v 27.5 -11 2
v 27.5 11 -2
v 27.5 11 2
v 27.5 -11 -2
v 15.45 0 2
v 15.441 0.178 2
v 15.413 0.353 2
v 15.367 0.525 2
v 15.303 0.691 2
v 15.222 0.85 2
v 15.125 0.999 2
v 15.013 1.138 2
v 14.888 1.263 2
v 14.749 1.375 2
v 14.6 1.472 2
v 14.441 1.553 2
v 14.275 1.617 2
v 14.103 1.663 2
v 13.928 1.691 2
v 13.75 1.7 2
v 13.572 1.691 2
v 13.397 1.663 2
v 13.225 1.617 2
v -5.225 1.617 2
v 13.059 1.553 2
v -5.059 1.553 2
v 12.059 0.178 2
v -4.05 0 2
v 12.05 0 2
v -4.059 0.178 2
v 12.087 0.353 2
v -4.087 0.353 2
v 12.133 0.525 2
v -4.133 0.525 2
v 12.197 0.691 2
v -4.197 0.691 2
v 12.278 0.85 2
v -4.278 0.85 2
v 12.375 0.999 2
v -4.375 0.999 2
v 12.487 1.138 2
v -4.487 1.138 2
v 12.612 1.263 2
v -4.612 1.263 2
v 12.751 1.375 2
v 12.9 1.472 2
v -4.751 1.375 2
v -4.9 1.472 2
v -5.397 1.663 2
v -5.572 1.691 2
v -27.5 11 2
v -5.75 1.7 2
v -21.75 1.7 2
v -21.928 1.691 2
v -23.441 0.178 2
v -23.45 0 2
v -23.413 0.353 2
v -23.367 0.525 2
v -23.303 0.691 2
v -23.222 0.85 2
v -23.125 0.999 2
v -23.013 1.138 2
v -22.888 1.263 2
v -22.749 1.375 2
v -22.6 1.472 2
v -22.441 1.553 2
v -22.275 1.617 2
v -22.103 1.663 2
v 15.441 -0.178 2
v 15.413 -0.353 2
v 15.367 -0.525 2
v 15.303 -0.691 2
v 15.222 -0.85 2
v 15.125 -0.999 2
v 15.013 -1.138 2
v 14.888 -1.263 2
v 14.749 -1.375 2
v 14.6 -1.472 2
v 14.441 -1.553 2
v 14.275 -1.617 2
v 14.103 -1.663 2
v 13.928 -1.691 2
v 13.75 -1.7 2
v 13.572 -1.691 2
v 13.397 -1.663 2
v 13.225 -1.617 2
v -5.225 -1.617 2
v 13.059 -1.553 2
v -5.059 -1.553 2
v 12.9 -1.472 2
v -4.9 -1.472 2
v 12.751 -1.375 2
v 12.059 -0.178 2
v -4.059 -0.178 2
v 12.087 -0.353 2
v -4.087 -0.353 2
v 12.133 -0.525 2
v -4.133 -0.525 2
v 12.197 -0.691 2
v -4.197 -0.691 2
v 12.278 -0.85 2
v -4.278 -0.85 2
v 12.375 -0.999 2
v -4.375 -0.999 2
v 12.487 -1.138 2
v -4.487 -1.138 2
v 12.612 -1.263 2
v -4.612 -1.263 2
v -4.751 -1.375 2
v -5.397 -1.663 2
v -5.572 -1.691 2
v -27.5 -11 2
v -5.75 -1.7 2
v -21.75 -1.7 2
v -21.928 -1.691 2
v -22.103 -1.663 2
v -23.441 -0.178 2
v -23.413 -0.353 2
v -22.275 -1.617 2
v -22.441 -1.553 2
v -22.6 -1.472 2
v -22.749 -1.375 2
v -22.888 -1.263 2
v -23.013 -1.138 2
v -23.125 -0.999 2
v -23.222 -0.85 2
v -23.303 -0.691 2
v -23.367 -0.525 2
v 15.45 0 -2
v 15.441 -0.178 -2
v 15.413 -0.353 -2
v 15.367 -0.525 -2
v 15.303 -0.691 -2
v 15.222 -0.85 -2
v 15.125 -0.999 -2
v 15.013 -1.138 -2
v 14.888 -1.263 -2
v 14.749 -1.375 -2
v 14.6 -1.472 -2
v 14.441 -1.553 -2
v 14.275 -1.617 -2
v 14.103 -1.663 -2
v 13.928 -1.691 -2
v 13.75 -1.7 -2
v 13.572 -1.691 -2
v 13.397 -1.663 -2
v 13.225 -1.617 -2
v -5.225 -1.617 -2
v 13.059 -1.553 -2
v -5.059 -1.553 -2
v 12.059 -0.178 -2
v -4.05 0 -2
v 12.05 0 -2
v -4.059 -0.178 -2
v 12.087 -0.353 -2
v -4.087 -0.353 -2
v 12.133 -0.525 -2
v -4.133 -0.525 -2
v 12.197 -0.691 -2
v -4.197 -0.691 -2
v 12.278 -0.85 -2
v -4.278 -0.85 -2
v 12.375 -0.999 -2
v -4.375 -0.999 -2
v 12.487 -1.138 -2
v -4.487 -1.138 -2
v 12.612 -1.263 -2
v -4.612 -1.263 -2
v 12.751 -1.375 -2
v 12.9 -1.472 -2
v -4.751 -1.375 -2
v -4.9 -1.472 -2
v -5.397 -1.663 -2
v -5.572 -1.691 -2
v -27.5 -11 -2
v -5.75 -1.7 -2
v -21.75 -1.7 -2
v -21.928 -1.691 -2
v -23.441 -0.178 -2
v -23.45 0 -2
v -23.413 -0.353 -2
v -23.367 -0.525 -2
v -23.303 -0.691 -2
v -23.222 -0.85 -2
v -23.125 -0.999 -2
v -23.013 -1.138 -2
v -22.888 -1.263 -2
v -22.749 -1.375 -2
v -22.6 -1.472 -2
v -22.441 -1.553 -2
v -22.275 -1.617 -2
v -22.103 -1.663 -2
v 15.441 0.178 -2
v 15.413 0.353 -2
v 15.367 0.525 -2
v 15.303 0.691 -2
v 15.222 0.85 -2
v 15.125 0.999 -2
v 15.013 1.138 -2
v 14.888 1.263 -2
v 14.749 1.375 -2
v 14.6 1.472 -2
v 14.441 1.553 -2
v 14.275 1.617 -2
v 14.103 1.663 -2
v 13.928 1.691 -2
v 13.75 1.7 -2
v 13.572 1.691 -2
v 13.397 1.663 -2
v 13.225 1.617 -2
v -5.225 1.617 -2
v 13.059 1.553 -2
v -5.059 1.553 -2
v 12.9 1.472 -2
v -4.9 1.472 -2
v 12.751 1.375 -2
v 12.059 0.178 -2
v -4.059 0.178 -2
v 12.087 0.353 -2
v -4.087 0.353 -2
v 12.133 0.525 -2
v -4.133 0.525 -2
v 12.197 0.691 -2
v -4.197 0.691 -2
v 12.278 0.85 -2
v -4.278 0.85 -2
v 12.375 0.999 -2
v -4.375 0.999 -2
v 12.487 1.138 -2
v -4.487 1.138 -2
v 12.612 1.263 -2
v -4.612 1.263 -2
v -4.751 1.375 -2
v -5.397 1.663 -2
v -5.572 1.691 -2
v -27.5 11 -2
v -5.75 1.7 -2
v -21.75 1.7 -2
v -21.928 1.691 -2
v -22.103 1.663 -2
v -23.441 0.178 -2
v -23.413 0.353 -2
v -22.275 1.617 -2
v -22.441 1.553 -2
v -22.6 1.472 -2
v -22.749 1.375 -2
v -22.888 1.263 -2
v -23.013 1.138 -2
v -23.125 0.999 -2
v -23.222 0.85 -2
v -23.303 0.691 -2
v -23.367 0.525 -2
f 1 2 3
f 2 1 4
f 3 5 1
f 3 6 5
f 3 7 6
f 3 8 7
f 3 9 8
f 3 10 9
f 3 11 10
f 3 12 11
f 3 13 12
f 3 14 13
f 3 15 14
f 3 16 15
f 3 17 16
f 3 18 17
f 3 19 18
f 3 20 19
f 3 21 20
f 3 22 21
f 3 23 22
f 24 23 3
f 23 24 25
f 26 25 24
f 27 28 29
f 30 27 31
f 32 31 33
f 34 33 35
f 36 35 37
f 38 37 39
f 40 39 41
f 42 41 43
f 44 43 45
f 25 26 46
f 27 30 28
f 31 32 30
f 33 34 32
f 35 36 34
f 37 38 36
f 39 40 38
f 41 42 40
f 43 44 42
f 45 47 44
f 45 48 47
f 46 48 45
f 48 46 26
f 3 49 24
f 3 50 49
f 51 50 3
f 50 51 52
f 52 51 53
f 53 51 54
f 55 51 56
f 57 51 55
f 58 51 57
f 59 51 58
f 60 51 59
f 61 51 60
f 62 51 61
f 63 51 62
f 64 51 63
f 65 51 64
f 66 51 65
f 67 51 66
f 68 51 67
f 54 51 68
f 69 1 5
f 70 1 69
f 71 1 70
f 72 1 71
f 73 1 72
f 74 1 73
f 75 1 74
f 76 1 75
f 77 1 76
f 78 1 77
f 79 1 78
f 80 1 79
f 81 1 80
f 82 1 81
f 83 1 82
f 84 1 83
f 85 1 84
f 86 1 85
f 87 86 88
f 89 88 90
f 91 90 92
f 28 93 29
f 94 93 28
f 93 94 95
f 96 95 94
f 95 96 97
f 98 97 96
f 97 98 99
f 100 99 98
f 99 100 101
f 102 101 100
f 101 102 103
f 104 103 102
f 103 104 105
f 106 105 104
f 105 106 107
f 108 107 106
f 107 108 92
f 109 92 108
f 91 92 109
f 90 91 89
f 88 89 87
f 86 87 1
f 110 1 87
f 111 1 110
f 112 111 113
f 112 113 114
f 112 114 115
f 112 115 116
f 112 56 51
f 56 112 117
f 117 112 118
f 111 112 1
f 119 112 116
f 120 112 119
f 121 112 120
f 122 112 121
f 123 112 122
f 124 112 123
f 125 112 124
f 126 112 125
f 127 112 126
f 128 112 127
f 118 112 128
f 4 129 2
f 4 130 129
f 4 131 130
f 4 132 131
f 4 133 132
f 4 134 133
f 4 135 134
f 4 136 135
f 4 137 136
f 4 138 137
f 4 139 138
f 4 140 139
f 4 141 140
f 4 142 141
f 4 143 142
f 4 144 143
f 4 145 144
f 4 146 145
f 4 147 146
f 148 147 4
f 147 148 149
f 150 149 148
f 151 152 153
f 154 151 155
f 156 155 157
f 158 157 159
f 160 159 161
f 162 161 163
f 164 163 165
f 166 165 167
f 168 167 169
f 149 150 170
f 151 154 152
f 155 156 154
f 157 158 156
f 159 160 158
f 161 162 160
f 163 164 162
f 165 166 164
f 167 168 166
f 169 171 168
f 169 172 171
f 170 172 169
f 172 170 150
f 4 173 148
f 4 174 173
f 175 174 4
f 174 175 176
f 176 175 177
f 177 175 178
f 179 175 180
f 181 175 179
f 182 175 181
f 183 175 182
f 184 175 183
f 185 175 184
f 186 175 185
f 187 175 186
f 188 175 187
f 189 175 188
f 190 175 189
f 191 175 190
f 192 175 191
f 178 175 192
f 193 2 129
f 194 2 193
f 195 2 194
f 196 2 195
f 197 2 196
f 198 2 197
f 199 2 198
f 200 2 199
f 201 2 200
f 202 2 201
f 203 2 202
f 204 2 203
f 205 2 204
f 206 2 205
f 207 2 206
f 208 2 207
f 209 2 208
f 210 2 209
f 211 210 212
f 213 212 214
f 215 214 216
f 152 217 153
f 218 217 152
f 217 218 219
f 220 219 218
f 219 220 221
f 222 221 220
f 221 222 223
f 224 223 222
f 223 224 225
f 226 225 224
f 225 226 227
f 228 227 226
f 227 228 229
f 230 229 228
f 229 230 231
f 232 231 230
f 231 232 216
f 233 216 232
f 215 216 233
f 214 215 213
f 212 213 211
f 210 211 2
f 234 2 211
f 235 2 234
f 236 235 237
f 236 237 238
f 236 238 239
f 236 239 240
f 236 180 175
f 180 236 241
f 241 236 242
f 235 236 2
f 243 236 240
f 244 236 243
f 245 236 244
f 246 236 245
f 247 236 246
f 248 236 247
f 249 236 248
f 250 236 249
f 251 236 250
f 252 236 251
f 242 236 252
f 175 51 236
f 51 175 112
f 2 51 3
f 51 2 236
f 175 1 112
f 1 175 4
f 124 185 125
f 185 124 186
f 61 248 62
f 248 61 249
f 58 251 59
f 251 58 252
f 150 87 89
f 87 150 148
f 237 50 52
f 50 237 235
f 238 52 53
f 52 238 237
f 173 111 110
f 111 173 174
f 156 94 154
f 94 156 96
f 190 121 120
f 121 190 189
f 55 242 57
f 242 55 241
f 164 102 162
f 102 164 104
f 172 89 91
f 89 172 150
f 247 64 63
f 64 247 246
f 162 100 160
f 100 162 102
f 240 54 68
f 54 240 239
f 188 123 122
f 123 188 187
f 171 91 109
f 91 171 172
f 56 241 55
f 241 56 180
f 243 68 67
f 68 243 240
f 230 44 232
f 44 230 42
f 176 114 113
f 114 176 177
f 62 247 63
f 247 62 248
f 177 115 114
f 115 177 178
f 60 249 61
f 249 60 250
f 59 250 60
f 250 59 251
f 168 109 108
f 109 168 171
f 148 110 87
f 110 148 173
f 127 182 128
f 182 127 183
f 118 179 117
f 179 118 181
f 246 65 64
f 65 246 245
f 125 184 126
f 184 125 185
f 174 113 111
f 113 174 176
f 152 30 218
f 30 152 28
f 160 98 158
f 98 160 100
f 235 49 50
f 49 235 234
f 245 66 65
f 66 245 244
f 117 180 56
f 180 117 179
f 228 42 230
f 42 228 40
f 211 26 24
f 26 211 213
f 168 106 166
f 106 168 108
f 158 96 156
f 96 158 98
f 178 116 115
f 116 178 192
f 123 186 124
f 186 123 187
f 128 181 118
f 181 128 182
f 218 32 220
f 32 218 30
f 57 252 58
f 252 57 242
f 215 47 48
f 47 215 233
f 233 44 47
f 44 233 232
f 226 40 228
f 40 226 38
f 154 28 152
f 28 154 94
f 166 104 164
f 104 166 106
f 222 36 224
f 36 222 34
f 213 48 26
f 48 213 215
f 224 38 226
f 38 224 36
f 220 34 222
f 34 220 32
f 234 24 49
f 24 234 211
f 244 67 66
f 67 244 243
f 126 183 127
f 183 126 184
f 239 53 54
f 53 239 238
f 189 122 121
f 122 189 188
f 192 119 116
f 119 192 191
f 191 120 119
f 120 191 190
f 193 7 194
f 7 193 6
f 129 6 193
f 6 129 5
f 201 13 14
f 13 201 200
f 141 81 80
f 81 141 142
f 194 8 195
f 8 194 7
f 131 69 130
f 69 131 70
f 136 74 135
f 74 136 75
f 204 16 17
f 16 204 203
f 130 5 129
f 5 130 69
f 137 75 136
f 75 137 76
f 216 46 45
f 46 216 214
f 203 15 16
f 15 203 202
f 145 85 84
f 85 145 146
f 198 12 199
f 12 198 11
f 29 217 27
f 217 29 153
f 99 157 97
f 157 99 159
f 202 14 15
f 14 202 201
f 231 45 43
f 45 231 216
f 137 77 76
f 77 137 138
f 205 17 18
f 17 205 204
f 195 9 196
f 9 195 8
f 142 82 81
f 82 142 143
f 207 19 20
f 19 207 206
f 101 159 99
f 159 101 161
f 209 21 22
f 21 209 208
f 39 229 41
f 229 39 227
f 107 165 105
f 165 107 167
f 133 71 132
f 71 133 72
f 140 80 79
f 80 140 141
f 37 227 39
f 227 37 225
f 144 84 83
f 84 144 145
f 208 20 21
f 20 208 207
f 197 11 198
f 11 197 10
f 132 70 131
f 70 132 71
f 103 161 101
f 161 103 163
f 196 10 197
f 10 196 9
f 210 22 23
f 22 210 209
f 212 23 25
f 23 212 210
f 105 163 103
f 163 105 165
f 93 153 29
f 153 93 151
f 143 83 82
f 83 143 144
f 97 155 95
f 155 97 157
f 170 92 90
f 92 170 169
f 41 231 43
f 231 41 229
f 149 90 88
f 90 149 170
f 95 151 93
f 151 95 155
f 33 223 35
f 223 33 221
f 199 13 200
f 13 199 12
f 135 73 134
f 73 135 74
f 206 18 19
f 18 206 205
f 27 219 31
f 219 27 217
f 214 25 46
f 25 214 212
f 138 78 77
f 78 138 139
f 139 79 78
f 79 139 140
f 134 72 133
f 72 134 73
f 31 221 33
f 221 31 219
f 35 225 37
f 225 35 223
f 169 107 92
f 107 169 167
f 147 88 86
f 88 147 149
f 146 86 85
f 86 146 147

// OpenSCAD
// Adjustable sensor mounting tab.
$fn = 60;
eps = 0.02;
length = 55;
width = 22;
thickness = 4;
slot_l = 16;
module slot(x) { hull() { translate([x-slot_l/2,0,-thickness/2-eps]) cylinder(d=3.4,h=thickness+2*eps); translate([x+slot_l/2,0,-thickness/2-eps]) cylinder(d=3.4,h=thickness+2*eps); } }
difference() { cube([length,width,thickness],center=true); slot(-length/4); translate([length/4,0,-thickness/2-eps]) cylinder(d=3.4,h=thickness+2*eps); }
